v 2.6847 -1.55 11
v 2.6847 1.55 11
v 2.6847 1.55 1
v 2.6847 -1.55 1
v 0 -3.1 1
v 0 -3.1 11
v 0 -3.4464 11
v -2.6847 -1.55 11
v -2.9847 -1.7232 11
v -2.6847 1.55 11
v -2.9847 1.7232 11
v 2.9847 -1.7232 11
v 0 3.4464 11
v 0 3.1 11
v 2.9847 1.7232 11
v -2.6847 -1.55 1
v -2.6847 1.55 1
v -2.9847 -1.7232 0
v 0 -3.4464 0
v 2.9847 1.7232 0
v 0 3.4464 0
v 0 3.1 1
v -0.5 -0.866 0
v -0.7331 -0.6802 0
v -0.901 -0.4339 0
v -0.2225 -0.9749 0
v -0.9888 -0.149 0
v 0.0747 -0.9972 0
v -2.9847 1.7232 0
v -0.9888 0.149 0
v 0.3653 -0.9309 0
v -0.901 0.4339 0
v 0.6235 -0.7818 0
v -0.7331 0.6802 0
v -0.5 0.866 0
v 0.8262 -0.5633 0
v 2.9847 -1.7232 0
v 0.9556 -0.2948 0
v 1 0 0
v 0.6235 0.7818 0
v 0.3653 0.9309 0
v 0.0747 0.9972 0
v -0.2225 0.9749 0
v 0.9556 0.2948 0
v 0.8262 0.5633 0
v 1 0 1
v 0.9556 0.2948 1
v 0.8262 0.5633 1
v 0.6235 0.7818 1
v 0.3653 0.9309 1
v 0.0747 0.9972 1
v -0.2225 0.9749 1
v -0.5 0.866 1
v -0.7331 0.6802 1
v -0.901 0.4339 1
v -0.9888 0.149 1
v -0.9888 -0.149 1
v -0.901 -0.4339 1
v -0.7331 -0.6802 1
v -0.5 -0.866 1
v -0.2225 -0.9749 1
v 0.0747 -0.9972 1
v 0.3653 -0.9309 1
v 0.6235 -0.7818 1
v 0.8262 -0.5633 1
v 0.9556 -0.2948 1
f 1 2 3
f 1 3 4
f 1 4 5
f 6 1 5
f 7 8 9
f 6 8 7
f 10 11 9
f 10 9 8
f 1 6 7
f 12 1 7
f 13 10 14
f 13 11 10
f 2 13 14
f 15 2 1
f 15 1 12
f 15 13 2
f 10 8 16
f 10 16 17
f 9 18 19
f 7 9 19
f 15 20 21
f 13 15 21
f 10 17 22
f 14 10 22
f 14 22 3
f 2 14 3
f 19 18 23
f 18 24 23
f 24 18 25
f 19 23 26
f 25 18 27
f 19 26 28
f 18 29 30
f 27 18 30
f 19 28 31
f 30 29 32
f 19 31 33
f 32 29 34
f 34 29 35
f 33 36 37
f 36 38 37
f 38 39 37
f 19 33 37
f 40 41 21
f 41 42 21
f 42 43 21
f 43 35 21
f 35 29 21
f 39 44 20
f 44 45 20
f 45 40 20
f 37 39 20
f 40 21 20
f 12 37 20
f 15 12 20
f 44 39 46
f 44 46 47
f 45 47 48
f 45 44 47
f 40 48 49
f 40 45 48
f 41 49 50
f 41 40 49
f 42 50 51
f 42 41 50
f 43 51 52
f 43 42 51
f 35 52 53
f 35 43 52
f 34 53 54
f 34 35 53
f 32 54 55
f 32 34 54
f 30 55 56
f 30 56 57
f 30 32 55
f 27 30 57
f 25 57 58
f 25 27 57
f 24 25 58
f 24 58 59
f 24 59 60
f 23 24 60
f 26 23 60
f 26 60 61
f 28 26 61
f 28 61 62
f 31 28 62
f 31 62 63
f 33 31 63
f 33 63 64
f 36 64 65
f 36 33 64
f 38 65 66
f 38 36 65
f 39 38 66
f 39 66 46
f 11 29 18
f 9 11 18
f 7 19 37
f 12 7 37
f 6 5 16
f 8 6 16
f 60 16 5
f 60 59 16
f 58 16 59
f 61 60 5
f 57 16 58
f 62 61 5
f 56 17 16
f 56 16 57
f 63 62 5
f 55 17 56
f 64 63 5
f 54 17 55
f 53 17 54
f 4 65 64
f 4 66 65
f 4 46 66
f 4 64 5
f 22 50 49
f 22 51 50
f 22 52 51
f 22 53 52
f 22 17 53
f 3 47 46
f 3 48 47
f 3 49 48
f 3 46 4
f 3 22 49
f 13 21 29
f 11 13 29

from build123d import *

# Parameters (mm, degrees)
F1_DEPTH = 11
F0_R     = 1
F2_DEPTH = 1


with BuildPart() as f1:
    # F0 (on Top) → F1 (new body)
    with BuildSketch(Plane.XY):
        Polygon((-2.984679, 1.723205), (-2.984679, -1.723205), (0, -3.44641), (2.984679, -1.723205), (2.984679, 1.723205), (0, 3.44641), align=None)
        Polygon((0, 3.1), (2.684679, 1.55), (2.684679, -1.55), (0, -3.1), (-2.684679, -1.55), (-2.684679, 1.55), align=None, mode=Mode.SUBTRACT)
    extrude(amount=F1_DEPTH)

    # F0 (on Top) → F2 (join)
    with BuildSketch(Plane.XY):
        Polygon((2.684679, -1.55), (2.684679, 1.55), (0, 3.1), (-2.684679, 1.55), (-2.684679, -1.55), (0, -3.1), align=None)
        Circle(F0_R, mode=Mode.SUBTRACT)
    extrude(amount=F2_DEPTH)


solid = f1.part
